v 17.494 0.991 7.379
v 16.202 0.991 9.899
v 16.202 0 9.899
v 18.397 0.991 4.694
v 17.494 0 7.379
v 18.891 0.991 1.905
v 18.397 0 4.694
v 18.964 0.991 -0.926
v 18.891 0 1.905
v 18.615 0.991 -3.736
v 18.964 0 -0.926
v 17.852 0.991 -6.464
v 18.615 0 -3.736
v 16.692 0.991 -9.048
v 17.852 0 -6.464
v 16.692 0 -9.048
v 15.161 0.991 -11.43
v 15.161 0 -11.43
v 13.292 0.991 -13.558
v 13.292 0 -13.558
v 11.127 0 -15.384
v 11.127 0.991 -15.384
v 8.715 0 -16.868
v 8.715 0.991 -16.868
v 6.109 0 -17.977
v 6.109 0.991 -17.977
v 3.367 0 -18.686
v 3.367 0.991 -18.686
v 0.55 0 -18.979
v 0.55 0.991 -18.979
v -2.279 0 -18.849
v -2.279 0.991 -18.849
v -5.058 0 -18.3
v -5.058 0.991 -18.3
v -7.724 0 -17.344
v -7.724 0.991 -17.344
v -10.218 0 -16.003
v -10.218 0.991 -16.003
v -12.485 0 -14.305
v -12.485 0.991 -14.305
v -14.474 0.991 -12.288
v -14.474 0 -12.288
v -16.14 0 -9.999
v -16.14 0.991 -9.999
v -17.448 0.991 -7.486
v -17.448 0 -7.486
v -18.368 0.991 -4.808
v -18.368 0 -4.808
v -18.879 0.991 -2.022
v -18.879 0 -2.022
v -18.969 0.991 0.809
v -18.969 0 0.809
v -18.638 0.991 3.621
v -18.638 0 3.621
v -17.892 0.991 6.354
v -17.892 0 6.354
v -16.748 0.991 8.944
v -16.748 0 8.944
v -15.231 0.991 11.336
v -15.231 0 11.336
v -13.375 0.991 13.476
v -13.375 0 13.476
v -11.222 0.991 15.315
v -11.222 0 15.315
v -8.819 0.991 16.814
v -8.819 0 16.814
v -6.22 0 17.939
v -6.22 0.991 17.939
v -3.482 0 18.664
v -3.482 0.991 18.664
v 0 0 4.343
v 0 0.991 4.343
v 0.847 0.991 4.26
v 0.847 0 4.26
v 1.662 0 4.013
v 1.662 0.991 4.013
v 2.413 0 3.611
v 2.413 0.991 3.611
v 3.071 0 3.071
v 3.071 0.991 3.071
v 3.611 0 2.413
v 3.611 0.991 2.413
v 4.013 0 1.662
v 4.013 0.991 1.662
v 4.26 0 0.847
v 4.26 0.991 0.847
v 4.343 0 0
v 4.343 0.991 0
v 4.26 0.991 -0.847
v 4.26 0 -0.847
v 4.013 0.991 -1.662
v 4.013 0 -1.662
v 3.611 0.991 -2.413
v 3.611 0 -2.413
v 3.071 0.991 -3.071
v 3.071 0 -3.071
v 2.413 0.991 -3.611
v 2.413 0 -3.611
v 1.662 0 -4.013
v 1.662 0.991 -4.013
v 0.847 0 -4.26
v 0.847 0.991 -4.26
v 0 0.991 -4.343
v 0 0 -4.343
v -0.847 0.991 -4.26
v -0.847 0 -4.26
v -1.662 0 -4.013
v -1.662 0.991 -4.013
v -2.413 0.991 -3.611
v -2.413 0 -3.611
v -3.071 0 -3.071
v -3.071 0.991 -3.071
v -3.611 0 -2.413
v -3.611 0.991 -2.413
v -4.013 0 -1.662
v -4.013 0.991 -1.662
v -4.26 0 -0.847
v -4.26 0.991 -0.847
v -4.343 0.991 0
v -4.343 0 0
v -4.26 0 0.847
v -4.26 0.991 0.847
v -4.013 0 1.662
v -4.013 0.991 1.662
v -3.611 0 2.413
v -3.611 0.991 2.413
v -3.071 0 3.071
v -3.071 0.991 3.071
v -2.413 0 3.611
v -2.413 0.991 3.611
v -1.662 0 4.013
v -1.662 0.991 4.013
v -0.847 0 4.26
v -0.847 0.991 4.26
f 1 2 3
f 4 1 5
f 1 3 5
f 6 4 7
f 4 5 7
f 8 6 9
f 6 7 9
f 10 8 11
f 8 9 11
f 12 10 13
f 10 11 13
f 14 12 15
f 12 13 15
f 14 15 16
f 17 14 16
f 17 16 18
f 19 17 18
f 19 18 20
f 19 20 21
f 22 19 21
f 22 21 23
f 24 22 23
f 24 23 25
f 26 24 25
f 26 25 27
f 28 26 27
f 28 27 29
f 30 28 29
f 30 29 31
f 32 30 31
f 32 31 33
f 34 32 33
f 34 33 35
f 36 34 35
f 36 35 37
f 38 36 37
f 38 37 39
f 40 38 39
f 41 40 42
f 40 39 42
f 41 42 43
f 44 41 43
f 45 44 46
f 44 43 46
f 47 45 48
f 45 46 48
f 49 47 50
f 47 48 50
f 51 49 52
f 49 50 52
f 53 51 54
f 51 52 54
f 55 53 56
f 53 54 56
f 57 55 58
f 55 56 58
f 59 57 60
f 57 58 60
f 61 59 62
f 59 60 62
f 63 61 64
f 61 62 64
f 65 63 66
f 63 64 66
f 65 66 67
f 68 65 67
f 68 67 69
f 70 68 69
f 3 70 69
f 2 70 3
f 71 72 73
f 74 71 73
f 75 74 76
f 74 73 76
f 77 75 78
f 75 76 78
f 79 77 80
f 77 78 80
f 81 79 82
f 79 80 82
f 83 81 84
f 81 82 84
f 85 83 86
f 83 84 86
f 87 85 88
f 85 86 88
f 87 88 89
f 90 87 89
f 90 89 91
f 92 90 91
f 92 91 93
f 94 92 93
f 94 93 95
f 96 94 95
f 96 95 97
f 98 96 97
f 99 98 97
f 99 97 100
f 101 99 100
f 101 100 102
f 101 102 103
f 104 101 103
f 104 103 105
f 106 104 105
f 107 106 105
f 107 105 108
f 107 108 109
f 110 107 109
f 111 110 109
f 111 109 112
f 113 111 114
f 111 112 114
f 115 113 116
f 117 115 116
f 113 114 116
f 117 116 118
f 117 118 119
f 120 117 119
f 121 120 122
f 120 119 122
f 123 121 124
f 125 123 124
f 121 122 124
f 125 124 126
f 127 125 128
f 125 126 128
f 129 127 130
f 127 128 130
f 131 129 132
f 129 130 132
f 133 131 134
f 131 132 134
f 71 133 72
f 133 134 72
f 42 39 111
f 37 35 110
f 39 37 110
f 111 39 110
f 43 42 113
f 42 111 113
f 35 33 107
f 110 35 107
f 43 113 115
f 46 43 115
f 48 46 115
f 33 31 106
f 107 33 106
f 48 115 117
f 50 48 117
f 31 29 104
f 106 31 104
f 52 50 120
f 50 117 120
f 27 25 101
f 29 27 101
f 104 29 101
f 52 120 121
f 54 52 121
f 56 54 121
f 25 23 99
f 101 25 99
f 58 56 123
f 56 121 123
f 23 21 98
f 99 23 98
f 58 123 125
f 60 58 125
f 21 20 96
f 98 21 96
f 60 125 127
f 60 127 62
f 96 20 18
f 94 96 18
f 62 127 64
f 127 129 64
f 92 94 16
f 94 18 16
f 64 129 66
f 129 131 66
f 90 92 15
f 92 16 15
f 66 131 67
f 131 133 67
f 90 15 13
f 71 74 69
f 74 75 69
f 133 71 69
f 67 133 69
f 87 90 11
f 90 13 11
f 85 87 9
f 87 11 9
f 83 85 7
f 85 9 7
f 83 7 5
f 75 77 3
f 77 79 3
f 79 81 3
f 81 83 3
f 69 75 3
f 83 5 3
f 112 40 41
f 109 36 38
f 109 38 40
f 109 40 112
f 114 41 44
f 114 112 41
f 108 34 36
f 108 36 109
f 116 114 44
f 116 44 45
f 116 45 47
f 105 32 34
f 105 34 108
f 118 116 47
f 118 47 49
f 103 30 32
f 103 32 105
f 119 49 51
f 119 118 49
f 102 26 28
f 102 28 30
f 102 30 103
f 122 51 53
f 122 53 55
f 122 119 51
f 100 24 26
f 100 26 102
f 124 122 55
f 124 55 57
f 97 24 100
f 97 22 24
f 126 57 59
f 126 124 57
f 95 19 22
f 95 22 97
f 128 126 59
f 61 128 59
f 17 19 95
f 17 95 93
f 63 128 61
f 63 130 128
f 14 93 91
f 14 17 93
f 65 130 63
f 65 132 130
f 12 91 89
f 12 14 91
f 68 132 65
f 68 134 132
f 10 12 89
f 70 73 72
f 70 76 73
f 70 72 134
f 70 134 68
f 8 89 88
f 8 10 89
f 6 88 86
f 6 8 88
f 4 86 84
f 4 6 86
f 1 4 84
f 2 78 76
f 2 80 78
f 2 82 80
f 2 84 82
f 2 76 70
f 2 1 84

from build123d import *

# Parameters (mm, degrees)
SKETCH5_R           = 18.9865
BOSS_EXTRUDE3_DEPTH = 0.9906
SKETCH6_R           = 4.3434
CUT_EXTRUDE2_DEPTH  = 27.869232458
CUT_EXTRUDE3_DEPTH  = 27.869232458


with BuildPart() as part:
    # Sketch5 → Boss-Extrude3 (new body)
    with BuildSketch(Plane(origin=(0, 0, 0), x_dir=(1, 0, 0), z_dir=(0, 1, 0))):
        with Locations(Location((0, 0, 0), (0, 0, 270))):
            Circle(SKETCH5_R)
    extrude(amount=BOSS_EXTRUDE3_DEPTH)

    # Sketch6 → Cut-Extrude2 (cut, through all)
    with BuildSketch(Plane(origin=(0, 0.9906, 0), x_dir=(1, 0, 0), z_dir=(0, 1, 0))):
        with Locations(Location((0, 0, 0), (0, 0, 270))):
            Circle(SKETCH6_R)
    extrude(amount=-CUT_EXTRUDE2_DEPTH, mode=Mode.SUBTRACT)

    # Sketch7 → Cut-Extrude3 (cut, through all)
    with BuildSketch(Plane(origin=(0, 0.9906, 0), x_dir=(1, 0, 0), z_dir=(0, 1, 0))):
        with BuildLine():
            Line((-3.48206546, -18.664468982), (16.20193564, -9.898710207))
            ThreePointArc((16.20193564, -9.898710207), (7.723885426, -17.344416282), (-3.48206546, -18.664468982))
        make_face()
    extrude(amount=-CUT_EXTRUDE3_DEPTH, mode=Mode.SUBTRACT)


solid = part.part
